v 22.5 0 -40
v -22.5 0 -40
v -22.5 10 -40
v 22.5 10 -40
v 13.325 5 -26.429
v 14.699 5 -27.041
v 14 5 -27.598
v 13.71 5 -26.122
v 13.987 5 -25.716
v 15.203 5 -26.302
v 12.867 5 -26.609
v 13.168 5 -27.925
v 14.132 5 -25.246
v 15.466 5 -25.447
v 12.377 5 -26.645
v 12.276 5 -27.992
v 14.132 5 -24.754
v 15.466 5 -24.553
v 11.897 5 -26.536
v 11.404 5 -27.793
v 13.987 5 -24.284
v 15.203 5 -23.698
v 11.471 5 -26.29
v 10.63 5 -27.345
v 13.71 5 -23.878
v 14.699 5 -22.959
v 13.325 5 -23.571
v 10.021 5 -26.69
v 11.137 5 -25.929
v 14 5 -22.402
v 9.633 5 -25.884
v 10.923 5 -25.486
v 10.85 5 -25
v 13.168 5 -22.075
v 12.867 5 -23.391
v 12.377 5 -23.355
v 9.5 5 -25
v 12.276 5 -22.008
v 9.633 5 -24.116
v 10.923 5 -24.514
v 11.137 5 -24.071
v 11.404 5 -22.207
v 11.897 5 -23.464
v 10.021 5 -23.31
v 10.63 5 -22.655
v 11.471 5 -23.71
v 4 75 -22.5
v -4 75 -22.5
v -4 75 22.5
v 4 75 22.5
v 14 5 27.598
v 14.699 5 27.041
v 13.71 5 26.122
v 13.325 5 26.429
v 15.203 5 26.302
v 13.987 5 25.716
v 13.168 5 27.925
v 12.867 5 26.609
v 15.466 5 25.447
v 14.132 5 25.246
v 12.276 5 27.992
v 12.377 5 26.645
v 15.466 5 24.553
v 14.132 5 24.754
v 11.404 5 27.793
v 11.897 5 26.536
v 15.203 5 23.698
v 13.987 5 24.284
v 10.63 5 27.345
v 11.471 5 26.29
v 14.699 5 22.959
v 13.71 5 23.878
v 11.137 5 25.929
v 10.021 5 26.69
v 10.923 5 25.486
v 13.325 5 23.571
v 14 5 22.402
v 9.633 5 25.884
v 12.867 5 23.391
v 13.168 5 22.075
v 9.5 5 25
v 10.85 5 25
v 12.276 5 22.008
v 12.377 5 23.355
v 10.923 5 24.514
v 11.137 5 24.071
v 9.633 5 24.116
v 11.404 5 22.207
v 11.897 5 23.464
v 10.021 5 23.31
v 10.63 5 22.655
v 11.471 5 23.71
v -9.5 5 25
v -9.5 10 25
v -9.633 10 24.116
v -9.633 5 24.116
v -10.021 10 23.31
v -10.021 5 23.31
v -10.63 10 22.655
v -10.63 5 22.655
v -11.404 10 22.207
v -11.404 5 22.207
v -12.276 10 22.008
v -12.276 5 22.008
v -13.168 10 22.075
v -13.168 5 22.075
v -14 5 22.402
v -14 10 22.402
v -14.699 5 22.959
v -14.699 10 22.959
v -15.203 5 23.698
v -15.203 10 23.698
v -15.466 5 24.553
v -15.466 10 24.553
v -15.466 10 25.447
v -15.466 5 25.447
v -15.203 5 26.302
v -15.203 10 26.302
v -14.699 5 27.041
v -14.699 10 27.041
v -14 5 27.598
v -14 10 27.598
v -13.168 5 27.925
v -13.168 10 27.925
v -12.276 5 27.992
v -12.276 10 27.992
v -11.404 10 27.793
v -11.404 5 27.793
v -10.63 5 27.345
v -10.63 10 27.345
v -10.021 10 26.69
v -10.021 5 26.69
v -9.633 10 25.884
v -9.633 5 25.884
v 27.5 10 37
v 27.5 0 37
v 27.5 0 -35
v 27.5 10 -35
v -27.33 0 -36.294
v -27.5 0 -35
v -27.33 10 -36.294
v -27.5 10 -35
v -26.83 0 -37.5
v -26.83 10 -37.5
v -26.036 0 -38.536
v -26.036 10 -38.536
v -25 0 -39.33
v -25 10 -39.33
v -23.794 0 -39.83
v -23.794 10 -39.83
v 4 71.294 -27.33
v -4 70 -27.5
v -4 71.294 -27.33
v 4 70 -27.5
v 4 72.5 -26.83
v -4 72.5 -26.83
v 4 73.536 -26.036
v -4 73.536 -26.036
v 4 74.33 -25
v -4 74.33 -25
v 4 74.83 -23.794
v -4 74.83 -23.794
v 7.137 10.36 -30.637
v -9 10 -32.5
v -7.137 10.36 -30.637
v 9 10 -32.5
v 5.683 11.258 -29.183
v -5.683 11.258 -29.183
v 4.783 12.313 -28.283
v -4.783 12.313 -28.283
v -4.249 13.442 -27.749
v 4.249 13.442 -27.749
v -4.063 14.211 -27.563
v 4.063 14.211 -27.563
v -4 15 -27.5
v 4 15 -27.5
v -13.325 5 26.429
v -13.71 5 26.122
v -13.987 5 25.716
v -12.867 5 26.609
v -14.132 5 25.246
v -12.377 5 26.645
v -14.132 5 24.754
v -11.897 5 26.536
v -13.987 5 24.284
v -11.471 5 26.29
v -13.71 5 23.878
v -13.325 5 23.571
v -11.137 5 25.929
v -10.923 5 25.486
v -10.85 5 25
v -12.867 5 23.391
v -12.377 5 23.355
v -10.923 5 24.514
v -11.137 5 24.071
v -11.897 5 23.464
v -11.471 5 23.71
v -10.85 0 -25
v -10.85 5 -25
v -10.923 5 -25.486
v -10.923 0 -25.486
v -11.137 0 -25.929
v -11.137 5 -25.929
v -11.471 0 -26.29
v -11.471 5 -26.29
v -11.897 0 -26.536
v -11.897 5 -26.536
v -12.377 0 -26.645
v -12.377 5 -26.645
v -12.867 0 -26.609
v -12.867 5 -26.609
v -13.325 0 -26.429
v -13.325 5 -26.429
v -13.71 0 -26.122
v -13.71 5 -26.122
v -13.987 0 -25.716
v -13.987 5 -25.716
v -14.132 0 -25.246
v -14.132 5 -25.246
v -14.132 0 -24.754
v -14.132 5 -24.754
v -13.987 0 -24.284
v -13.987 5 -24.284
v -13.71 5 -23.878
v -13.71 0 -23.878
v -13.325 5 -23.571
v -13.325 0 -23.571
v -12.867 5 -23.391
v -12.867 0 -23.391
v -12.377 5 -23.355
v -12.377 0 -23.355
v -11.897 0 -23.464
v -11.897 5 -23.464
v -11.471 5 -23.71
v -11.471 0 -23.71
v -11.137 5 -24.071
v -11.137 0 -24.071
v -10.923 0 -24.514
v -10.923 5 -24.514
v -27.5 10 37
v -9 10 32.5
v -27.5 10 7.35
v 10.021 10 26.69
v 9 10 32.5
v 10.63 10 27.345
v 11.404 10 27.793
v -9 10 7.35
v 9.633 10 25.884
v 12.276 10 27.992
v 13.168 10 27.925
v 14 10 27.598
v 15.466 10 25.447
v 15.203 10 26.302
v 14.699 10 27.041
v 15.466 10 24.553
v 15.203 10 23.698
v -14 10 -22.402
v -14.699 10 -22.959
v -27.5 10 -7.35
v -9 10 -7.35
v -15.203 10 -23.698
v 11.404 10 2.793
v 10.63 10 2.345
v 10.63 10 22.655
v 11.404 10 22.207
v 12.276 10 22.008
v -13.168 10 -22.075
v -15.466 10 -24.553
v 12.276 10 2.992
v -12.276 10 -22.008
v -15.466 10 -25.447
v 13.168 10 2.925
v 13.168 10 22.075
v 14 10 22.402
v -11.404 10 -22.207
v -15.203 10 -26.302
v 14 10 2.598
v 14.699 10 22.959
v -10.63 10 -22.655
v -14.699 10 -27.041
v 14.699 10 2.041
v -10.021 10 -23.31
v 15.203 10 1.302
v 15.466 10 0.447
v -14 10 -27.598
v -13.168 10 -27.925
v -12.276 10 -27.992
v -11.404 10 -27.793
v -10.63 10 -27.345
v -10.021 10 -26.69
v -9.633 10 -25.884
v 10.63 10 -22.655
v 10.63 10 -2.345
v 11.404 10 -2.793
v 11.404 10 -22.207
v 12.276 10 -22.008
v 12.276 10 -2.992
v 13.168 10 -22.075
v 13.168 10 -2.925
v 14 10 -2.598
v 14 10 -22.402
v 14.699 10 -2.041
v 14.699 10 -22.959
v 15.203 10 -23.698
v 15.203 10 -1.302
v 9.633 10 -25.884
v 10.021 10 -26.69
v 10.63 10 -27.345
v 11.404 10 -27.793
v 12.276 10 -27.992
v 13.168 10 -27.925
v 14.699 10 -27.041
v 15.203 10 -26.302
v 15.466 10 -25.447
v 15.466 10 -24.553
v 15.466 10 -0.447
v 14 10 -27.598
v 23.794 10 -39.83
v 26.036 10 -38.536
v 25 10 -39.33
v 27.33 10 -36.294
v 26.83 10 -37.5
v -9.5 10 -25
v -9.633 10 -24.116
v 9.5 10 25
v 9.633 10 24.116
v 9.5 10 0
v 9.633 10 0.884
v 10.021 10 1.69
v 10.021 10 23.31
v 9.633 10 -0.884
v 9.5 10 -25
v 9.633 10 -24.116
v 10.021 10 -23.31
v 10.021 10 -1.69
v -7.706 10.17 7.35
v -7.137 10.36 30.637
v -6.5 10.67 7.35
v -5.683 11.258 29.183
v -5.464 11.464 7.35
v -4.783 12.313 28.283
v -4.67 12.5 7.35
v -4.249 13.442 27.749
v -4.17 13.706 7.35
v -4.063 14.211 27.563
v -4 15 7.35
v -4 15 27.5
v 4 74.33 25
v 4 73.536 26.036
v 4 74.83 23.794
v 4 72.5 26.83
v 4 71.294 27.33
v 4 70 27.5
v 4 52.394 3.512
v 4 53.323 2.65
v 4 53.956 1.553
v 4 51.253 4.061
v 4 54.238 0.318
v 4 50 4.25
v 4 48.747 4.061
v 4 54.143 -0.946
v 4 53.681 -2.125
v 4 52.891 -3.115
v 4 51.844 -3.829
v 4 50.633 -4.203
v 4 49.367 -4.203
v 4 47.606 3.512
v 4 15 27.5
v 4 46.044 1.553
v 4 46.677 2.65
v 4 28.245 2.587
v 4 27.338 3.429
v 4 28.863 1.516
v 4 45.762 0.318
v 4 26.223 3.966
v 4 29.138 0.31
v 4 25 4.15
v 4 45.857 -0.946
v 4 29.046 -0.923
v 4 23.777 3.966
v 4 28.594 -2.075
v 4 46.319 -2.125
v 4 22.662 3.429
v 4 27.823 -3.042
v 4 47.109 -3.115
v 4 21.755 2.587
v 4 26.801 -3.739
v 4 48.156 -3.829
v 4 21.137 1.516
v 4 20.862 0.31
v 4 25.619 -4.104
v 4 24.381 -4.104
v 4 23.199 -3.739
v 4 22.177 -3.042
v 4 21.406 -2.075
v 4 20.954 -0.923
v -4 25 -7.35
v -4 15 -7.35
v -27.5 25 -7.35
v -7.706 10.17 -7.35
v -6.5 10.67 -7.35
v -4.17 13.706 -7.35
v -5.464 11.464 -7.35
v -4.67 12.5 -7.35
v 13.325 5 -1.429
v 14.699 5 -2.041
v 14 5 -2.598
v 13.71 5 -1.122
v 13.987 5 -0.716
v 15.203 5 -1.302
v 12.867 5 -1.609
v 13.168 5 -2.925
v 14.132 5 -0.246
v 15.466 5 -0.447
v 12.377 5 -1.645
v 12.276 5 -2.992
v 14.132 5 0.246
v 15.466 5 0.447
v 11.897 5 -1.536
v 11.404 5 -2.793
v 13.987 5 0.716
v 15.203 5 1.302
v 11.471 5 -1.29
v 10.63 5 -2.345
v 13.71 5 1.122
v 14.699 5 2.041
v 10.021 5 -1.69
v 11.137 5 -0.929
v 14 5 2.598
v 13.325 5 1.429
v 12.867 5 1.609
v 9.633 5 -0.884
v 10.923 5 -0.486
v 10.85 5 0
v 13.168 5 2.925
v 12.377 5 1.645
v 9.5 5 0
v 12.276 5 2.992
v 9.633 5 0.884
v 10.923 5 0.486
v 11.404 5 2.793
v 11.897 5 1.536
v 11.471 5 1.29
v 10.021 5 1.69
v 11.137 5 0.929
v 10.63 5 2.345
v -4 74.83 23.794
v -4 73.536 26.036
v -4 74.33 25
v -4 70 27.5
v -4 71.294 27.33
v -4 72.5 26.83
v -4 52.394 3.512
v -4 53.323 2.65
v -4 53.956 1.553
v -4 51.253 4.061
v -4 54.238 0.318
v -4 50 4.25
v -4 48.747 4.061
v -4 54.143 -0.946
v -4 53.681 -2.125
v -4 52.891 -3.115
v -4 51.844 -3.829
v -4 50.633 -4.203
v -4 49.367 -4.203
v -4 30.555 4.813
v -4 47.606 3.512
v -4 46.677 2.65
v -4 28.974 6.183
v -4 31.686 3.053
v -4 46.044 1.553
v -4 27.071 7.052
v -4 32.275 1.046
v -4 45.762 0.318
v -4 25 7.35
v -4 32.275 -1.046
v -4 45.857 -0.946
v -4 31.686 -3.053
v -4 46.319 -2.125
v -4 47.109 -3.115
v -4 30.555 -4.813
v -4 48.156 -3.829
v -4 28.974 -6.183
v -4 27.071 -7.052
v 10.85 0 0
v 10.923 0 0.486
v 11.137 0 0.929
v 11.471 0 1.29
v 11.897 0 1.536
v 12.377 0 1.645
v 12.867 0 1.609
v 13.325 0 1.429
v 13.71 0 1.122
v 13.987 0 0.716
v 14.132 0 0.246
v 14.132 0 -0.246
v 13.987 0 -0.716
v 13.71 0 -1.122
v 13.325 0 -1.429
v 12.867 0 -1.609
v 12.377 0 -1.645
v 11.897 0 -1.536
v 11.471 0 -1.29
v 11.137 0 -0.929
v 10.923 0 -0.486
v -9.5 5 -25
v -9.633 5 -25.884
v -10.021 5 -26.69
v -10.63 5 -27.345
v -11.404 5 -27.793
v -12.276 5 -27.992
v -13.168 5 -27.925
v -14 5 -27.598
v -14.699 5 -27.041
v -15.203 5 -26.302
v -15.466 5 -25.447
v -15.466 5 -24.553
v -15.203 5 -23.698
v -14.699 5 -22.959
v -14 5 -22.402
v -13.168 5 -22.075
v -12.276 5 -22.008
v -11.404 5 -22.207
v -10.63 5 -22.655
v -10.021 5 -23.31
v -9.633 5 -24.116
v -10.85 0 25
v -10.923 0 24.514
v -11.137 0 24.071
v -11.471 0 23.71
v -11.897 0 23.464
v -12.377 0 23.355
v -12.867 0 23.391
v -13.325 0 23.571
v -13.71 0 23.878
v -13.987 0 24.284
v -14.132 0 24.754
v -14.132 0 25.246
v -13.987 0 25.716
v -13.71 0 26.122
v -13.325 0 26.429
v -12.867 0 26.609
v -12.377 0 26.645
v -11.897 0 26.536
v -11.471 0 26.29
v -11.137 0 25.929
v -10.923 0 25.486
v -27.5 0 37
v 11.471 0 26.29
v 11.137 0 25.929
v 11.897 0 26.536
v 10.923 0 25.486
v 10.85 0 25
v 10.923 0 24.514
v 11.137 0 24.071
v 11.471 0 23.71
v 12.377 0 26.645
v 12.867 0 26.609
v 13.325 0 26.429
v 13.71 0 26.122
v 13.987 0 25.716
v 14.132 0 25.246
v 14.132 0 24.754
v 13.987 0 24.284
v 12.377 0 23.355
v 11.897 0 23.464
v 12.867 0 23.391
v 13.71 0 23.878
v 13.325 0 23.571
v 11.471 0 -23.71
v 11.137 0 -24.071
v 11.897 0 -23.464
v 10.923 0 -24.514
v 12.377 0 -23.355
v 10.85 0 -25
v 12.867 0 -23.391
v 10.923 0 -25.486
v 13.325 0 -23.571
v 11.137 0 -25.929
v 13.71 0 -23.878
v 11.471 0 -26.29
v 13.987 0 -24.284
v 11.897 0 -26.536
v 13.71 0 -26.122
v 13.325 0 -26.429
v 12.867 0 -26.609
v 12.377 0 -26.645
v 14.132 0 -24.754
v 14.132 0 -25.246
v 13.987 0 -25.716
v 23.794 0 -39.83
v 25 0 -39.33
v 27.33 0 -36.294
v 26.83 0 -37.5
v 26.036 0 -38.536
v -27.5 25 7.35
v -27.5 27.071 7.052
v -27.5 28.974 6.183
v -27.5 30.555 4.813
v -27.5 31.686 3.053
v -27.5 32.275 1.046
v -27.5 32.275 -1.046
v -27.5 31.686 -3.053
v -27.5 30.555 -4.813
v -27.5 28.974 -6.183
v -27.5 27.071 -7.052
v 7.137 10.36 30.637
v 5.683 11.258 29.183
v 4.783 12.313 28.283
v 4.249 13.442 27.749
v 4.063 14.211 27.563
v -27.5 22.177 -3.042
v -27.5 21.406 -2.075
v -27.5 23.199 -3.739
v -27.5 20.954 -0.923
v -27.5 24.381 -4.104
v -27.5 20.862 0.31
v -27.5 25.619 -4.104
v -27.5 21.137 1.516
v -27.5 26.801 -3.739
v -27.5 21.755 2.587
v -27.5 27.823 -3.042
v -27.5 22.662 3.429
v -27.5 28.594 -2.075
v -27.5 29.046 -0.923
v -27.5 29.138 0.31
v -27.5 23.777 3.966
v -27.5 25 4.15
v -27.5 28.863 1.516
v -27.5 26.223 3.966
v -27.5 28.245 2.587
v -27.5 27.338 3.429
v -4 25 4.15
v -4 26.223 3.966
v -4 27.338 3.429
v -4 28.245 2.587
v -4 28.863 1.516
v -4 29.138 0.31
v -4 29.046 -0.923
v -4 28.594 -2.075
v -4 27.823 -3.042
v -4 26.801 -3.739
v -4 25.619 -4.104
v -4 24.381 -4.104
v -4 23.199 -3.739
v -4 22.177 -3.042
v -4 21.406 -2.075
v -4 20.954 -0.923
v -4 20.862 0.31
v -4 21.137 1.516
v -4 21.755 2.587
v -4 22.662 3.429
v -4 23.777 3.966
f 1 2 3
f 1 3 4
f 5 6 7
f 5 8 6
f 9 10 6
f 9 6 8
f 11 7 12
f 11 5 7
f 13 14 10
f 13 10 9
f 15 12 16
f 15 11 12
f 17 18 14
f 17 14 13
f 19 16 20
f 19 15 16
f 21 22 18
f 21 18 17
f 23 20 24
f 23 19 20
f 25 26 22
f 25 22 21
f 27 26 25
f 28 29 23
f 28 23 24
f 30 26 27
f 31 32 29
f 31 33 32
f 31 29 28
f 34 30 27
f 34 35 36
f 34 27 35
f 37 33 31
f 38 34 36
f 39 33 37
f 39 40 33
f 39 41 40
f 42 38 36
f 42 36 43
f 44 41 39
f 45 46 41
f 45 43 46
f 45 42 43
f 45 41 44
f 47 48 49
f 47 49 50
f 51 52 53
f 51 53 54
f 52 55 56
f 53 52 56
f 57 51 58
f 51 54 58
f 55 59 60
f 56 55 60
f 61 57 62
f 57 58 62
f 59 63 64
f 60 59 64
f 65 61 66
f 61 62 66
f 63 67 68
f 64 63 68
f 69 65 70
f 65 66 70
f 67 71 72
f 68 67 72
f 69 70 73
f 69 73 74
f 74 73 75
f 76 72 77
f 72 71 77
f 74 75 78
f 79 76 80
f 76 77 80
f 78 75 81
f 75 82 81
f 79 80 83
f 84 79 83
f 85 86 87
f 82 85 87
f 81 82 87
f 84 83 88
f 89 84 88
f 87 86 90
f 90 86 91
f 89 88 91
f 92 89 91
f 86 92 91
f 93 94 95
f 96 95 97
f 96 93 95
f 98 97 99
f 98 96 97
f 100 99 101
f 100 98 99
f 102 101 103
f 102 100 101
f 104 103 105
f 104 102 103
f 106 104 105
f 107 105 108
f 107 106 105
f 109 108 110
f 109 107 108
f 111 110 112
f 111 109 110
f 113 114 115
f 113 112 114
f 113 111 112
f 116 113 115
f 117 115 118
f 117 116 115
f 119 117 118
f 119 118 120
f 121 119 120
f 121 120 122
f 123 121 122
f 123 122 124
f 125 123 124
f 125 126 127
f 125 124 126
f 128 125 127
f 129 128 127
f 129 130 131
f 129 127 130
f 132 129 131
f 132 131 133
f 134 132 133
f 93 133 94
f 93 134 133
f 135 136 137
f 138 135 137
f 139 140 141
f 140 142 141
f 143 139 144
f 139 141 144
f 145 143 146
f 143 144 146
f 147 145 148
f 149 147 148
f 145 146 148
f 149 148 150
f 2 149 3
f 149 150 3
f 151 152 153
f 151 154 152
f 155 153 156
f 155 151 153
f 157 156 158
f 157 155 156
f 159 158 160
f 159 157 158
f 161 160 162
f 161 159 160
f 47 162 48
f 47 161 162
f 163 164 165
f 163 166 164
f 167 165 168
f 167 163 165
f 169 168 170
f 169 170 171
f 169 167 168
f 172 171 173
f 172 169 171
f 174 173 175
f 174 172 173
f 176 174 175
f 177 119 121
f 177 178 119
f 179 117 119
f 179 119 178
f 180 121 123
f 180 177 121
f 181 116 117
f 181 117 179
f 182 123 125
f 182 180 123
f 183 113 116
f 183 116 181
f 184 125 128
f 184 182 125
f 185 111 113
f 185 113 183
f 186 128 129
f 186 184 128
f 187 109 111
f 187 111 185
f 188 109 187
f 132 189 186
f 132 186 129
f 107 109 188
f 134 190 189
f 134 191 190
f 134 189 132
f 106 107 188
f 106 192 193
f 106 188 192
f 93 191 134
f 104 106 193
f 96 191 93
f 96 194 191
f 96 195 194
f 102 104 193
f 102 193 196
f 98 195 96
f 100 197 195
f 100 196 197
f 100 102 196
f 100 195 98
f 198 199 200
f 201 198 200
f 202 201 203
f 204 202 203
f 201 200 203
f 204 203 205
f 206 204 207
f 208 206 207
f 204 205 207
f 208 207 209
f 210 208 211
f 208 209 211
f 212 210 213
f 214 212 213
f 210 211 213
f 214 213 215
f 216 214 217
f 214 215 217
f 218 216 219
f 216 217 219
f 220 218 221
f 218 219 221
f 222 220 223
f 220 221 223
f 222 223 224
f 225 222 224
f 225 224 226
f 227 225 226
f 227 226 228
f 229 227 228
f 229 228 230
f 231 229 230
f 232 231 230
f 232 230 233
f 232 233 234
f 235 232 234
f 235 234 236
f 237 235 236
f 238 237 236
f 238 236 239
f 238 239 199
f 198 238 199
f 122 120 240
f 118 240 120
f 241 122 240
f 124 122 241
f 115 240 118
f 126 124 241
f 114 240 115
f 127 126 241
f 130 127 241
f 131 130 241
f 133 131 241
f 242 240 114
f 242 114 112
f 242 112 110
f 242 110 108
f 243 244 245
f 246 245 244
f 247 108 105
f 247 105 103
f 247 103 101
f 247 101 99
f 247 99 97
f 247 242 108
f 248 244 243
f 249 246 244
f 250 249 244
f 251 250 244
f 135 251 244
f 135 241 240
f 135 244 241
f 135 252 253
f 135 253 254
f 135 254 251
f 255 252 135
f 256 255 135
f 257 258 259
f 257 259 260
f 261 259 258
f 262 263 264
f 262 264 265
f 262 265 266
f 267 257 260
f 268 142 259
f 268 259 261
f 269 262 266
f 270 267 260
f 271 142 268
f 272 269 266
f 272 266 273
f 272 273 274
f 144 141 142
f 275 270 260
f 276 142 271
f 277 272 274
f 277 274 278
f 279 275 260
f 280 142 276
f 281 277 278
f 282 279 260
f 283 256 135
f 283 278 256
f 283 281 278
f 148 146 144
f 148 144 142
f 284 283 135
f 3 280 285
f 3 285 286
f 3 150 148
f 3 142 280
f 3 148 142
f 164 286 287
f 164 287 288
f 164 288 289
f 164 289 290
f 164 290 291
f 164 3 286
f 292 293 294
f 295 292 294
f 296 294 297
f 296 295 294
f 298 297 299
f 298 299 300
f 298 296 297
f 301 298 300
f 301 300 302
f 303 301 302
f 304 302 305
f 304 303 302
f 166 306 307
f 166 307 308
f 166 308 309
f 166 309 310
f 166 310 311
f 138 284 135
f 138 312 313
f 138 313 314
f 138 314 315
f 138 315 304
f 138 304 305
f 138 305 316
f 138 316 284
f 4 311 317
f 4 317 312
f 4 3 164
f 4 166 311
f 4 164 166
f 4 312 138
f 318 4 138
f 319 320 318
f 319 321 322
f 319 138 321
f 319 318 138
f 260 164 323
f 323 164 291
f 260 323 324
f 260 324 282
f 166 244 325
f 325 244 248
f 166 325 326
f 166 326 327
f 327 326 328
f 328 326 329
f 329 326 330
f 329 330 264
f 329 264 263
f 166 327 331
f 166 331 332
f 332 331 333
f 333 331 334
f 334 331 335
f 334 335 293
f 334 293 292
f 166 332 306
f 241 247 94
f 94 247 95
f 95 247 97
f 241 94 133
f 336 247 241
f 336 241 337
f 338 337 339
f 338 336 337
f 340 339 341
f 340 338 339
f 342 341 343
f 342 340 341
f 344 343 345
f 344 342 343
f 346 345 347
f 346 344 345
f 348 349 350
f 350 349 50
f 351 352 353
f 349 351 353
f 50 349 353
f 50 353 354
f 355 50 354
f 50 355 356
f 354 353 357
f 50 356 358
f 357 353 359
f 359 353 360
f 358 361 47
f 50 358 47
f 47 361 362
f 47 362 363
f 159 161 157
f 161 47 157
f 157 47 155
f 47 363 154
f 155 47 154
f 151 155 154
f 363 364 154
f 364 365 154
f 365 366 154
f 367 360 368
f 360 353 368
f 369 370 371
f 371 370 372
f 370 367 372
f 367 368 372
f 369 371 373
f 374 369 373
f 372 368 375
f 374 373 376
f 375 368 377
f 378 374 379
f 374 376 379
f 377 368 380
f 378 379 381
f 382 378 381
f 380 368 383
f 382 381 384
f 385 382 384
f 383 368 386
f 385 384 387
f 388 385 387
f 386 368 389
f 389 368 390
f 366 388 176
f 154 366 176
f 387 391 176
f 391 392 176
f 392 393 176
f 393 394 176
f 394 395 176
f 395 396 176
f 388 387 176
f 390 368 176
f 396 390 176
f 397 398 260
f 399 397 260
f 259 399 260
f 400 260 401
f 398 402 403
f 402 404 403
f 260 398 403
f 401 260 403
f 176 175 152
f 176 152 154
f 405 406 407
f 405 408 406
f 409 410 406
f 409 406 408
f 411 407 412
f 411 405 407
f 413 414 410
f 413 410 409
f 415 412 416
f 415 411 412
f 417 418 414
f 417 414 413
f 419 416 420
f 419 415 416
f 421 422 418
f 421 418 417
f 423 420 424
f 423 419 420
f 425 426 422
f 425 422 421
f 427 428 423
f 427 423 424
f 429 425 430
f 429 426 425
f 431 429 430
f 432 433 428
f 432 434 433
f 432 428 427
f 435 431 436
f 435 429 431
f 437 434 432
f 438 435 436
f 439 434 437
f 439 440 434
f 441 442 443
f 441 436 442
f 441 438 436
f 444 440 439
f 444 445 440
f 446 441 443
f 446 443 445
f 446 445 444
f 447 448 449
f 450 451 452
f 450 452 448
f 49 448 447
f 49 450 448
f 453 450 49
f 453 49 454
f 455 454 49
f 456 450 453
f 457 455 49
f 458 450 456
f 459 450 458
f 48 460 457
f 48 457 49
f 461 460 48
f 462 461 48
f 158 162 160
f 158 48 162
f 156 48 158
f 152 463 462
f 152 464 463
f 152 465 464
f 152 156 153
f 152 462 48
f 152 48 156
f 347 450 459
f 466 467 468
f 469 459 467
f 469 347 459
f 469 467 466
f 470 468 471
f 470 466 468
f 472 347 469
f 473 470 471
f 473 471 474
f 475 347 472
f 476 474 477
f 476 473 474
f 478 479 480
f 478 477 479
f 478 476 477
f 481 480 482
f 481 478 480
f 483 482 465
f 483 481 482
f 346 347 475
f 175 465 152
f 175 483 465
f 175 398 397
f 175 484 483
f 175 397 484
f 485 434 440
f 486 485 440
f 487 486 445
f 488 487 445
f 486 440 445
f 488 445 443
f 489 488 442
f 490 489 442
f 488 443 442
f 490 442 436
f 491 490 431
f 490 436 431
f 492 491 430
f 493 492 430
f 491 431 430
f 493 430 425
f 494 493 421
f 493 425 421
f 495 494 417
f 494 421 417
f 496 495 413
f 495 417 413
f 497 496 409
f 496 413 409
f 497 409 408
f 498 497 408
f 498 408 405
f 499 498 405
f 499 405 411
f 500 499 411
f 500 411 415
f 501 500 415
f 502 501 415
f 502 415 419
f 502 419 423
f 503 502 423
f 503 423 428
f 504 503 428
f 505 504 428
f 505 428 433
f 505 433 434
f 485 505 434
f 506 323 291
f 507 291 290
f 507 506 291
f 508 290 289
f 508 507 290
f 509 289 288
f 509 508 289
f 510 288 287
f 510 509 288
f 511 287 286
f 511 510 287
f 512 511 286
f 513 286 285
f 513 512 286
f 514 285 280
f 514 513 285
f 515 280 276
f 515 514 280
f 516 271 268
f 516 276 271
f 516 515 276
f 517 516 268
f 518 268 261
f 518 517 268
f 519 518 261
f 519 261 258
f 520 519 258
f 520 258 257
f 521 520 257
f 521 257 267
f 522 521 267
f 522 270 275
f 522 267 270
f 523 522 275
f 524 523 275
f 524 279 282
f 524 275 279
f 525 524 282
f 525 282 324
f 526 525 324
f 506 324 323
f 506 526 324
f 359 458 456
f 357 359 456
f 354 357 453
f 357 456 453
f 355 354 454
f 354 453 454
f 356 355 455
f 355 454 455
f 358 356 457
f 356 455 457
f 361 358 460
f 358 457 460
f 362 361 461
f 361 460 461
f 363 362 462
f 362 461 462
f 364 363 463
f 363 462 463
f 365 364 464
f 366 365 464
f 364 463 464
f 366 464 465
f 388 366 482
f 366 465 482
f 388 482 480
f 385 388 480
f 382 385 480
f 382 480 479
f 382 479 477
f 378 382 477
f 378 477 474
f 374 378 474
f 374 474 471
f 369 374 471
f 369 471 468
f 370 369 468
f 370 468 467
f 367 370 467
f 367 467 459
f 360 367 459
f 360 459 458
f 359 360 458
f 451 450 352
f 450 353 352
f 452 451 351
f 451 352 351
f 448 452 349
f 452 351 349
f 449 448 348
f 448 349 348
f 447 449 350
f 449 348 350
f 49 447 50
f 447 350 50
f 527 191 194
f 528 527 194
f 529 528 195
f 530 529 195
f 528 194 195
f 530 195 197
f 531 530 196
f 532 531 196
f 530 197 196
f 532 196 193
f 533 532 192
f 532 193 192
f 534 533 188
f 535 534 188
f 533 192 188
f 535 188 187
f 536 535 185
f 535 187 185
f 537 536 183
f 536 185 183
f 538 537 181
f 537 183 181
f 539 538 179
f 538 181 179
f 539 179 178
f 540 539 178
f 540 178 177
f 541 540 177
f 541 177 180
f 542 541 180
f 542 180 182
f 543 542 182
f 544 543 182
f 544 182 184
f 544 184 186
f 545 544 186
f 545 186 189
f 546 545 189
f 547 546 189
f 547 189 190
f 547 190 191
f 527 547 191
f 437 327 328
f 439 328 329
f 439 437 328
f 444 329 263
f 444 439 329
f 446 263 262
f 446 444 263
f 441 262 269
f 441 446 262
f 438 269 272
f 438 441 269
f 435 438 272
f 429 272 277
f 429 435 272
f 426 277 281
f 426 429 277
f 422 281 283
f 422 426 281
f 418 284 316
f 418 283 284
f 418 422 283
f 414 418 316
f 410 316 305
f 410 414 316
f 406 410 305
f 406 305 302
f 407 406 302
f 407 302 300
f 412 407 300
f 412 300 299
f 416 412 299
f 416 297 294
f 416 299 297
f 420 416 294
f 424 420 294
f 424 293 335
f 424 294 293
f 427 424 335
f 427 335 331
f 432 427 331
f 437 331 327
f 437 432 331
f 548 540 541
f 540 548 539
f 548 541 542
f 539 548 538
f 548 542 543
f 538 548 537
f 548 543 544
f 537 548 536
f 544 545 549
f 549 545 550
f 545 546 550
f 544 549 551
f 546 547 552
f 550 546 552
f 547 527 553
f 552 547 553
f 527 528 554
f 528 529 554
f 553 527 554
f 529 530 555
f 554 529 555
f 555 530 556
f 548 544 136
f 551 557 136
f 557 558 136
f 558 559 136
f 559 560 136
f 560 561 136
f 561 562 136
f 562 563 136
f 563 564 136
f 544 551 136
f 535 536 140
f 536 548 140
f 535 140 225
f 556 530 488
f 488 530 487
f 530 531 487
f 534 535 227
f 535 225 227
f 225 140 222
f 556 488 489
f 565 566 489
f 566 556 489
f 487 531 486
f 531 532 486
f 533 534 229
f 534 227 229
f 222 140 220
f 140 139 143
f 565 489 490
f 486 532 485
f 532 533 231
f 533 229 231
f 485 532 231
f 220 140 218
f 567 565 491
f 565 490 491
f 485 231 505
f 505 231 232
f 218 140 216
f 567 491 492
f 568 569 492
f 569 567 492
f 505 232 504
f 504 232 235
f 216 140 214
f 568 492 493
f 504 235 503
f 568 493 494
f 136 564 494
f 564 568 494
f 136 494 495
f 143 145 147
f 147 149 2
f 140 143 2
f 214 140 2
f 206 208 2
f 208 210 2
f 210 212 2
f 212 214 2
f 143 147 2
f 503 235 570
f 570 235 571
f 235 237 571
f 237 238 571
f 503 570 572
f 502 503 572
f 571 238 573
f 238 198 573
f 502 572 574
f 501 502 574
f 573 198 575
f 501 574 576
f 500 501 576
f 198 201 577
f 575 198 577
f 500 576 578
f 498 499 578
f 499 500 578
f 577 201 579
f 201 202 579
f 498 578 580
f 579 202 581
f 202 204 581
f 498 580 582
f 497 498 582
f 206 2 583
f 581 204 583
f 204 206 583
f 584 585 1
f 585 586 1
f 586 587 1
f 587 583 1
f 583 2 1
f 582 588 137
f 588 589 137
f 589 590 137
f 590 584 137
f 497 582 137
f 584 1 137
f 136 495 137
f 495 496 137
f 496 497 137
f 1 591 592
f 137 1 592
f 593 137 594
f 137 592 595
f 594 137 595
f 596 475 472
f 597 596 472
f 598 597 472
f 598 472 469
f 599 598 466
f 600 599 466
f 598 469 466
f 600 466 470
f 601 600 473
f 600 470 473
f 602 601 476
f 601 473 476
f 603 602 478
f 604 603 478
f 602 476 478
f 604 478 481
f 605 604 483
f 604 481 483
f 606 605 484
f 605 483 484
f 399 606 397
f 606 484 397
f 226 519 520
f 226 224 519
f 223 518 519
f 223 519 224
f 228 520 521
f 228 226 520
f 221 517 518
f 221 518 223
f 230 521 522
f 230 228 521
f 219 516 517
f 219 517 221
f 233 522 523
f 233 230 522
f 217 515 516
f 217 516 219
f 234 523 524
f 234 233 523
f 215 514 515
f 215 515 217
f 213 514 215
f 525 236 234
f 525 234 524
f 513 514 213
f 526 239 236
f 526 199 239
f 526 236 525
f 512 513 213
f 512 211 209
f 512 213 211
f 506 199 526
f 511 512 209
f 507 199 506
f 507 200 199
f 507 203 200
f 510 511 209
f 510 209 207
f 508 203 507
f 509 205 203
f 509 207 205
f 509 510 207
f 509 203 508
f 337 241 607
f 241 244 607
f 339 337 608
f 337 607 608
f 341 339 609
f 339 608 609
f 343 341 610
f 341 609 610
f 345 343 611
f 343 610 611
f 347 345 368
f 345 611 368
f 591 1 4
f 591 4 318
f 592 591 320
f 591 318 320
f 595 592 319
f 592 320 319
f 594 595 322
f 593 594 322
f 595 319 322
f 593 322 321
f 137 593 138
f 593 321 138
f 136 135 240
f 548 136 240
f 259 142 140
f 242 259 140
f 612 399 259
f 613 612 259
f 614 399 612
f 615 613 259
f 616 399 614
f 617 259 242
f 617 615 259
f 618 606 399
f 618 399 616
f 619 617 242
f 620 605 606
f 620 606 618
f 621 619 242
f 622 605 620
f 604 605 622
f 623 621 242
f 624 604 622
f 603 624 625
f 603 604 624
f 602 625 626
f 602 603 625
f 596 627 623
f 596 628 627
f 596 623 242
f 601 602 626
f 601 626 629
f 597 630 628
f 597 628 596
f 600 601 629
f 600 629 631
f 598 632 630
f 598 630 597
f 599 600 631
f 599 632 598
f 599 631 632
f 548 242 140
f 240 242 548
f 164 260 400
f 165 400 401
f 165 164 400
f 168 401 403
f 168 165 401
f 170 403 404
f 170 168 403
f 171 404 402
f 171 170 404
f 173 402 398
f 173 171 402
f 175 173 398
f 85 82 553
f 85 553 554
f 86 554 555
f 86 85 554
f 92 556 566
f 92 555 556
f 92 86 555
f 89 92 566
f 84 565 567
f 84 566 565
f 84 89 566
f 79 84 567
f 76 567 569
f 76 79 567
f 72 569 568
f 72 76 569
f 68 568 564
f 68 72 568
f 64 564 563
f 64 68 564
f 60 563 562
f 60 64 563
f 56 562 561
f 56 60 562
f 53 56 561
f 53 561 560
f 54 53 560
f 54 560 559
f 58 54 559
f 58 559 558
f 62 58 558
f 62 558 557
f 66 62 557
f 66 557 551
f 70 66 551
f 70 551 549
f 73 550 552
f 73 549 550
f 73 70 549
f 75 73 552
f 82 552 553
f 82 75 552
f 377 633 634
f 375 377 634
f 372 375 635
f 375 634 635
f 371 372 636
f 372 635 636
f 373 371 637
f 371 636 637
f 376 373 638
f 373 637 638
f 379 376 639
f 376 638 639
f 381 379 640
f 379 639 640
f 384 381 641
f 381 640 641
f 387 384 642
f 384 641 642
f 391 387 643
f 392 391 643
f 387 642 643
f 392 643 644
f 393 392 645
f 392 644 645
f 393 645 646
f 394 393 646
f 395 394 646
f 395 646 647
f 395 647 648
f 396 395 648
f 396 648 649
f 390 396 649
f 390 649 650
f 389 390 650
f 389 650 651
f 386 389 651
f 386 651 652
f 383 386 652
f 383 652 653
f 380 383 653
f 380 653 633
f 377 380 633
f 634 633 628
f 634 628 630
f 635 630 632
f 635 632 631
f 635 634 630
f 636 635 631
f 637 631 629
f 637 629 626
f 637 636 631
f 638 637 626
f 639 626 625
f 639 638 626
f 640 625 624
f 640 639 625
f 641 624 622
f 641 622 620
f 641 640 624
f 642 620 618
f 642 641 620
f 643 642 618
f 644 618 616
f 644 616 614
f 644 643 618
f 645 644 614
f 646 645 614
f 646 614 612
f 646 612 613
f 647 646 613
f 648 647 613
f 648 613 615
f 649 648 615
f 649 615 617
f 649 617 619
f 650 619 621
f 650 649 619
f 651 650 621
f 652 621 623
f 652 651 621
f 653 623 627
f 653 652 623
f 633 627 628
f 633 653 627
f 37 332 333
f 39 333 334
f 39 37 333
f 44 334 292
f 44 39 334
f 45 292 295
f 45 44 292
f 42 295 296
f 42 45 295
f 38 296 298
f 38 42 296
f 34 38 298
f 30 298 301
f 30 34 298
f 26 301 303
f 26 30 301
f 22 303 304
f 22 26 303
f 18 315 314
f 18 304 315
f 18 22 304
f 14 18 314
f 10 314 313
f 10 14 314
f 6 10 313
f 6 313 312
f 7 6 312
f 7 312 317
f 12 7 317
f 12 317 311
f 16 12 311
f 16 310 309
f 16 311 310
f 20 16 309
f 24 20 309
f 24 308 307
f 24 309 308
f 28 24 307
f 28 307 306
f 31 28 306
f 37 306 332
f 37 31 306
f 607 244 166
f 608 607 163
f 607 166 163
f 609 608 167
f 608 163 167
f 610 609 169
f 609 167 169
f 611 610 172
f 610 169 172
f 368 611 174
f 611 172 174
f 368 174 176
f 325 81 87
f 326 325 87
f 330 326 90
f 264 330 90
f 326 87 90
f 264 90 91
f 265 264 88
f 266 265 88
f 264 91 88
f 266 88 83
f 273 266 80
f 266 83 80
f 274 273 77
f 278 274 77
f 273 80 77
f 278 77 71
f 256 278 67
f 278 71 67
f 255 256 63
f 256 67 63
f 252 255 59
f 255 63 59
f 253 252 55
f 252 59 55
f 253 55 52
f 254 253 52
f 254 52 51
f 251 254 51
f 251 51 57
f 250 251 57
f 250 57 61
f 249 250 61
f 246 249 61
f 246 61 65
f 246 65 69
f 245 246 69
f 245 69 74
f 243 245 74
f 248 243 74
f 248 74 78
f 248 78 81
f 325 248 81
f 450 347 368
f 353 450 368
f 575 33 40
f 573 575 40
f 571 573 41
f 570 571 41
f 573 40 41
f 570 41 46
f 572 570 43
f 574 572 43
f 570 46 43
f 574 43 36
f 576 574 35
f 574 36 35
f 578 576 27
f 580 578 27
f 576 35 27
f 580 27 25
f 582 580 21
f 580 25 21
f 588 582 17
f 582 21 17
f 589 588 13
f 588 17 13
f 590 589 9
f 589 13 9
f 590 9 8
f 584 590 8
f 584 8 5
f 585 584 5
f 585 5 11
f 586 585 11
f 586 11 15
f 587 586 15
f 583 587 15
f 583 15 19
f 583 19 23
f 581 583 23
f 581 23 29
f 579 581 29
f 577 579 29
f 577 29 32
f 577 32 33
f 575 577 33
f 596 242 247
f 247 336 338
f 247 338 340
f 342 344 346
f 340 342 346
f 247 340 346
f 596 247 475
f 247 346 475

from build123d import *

# Parameters (mm, degrees)
SKETCH1_W               = 55
SKETCH1_H               = 80
BOSS_EXTRUDE1_DEPTH     = 10
SKETCH6_R               = 1.65
CUT_EXTRUDE2_DEPTH      = 55
LPATTERN1_COUNT         = 3
LPATTERN1_PITCH         = 25
MIRROR3_COPY_1_SKETCH_R = 1.65
MIRROR3_COPY_1_DEPTH    = 55
MIRROR3_COPY_2_SKETCH_R = 1.65
MIRROR3_COPY_2_DEPTH    = 55
SKETCH8_W               = 8
SKETCH8_H               = 55
BOSS_EXTRUDE3_DEPTH     = 65
FILLET3_R               = 5
SKETCH9_R               = 4.25
CUT_EXTRUDE3_DEPTH      = 32.5
CUT_EXTRUDE5_START      = -5
SKETCH11_R              = 3
CUT_EXTRUDE5_DEPTH      = 71
LPATTERN2_COUNT         = 3
LPATTERN2_PITCH         = 25
MIRROR4_START           = -5
MIRROR4_COPY_1_SKETCH_R = 3
MIRROR4_COPY_1_DEPTH    = 71
MIRROR4_COPY_2_SKETCH_R = 3
MIRROR4_COPY_2_DEPTH    = 71
CUT_EXTRUDE6_DEPTH      = 10
SKETCH13_R              = 4.15
BOSS_EXTRUDE4_DEPTH     = 23.5
SKETCH14_R              = 4.15
CUT_EXTRUDE7_DEPTH      = 20


with BuildPart() as part:
    # Sketch1 → Boss-Extrude1 (new body)
    with BuildSketch(Plane(origin=(0, 0, 0), x_dir=(1, 0, 0), z_dir=(0, 1, 0))):
        Rectangle(SKETCH1_W, SKETCH1_H)
    extrude(amount=BOSS_EXTRUDE1_DEPTH)

    # Sketch6 → Cut-Extrude2 (cut)
    with BuildSketch(Plane(origin=(0, 10, 0), x_dir=(1, 0, 0), z_dir=(0, 1, 0))):
        with Locations((-12.5, -25)):
            Circle(SKETCH6_R)
    cut_extrude2 = extrude(amount=-CUT_EXTRUDE2_DEPTH, mode=Mode.SUBTRACT)

    # LPattern1: Cut-Extrude2 ×3
    with Locations(*[(0, 0, -i * LPATTERN1_PITCH) for i in range(1, LPATTERN1_COUNT)]):
        add(cut_extrude2, mode=Mode.SUBTRACT)

    # Mirror3: Cut-Extrude2 across plane
    add(cut_extrude2.mirror(Plane(origin=(0, 0, 0), x_dir=(0, 0, 1), z_dir=(1, 0, 0))), mode=Mode.SUBTRACT)

    # Mirror3 copy 1 sketch → Mirror3 copy 1 (cut)
    with BuildSketch(Plane(origin=(0, 10, -25), x_dir=(-1, 0, 0), z_dir=(0, 1, 0))):
        with Locations((-12.5, 25)):
            Circle(MIRROR3_COPY_1_SKETCH_R)
    extrude(amount=-MIRROR3_COPY_1_DEPTH, mode=Mode.SUBTRACT)

    # Mirror3 copy 2 sketch → Mirror3 copy 2 (cut)
    with BuildSketch(Plane(origin=(0, 10, -50), x_dir=(-1, 0, 0), z_dir=(0, 1, 0))):
        with Locations((-12.5, 25)):
            Circle(MIRROR3_COPY_2_SKETCH_R)
    extrude(amount=-MIRROR3_COPY_2_DEPTH, mode=Mode.SUBTRACT)

    # Sketch8 → Boss-Extrude3 (add)
    with BuildSketch(Plane(origin=(0, 10, 0), x_dir=(1, 0, 0), z_dir=(0, 1, 0))):
        Rectangle(SKETCH8_W, SKETCH8_H)
    extrude(amount=BOSS_EXTRUDE3_DEPTH)

    # Fillet3
    fillet3_edges = [part.edges().sort_by_distance(p)[0] for p in [
        (4, 10, 0),
        (0, 10, -27.5),
        (-4, 10, 0),
        (0, 10, 27.5),
        (0, 75, -27.5),
        (0, 75, 27.5),
        (-27.5, 5, -40),
        (27.5, 5, -40),
    ]]
    fillet(fillet3_edges, radius=FILLET3_R)

    # Sketch9 → Cut-Extrude3 (cut, through all)
    with BuildSketch(Plane.ZY.offset(4)):
        with Locations((0, 50)):
            Circle(SKETCH9_R)
    extrude(amount=-CUT_EXTRUDE3_DEPTH, mode=Mode.SUBTRACT)

    # Sketch11 → Cut-Extrude5 (cut)
    with BuildSketch(Plane(origin=(0, 10, 0), x_dir=(1, 0, 0), z_dir=(0, 1, 0)).offset(CUT_EXTRUDE5_START)):
        with Locations((-12.5, -25)):
            Circle(SKETCH11_R)
    cut_extrude5 = extrude(amount=CUT_EXTRUDE5_DEPTH, mode=Mode.SUBTRACT)

    # LPattern2: Cut-Extrude5 ×3
    with Locations(*[(0, 0, -i * LPATTERN2_PITCH) for i in range(1, LPATTERN2_COUNT)]):
        add(cut_extrude5, mode=Mode.SUBTRACT)

    # Mirror4: Cut-Extrude5 across plane
    add(cut_extrude5.mirror(Plane(origin=(0, 0, 0), x_dir=(0, 0, 1), z_dir=(1, 0, 0))), mode=Mode.SUBTRACT)

    # Mirror4 copy 1 sketch → Mirror4 copy 1 (cut)
    with BuildSketch(Plane(origin=(0, 10, -25), x_dir=(-1, 0, 0), z_dir=(0, 1, 0)).offset(MIRROR4_START)):
        with Locations((-12.5, 25)):
            Circle(MIRROR4_COPY_1_SKETCH_R)
    extrude(amount=MIRROR4_COPY_1_DEPTH, mode=Mode.SUBTRACT)

    # Mirror4 copy 2 sketch → Mirror4 copy 2 (cut)
    with BuildSketch(Plane(origin=(0, 10, -50), x_dir=(-1, 0, 0), z_dir=(0, 1, 0)).offset(MIRROR4_START)):
        with Locations((-12.5, 25)):
            Circle(MIRROR4_COPY_2_SKETCH_R)
    extrude(amount=MIRROR4_COPY_2_DEPTH, mode=Mode.SUBTRACT)

    # Sketch12 → Cut-Extrude6 (cut)
    with BuildSketch(Plane(origin=(0, 10, 0), x_dir=(1, 0, 0), z_dir=(0, 1, 0))):
        Polygon((12.5, -37), (-38.055736231, -37), (-38.055736231, -44.287300659), (40.369344369, -44.287300659), (40.369344369, -37), align=None)
    extrude(amount=-CUT_EXTRUDE6_DEPTH, mode=Mode.SUBTRACT)

    # Sketch13 → Boss-Extrude4 (add)
    with BuildSketch(Plane.ZY.offset(4)):
        with BuildLine():
            Line((-7.35, 25), (-7.35, 0))
            Line((-7.35, 0), (7.35, 0))
            Line((7.35, 0), (7.35, 25))
            ThreePointArc((7.35, 25), (0, 32.35), (-7.35, 25))
        make_face()
        with Locations((0, 25)):
            Circle(SKETCH13_R, mode=Mode.SUBTRACT)
    extrude(amount=BOSS_EXTRUDE4_DEPTH)

    # Sketch14 → Cut-Extrude7 (cut)
    with BuildSketch(Plane.ZY.offset(4)):
        with Locations((0, 25)):
            Circle(SKETCH14_R)
    extrude(amount=-CUT_EXTRUDE7_DEPTH, mode=Mode.SUBTRACT)


solid = part.part
